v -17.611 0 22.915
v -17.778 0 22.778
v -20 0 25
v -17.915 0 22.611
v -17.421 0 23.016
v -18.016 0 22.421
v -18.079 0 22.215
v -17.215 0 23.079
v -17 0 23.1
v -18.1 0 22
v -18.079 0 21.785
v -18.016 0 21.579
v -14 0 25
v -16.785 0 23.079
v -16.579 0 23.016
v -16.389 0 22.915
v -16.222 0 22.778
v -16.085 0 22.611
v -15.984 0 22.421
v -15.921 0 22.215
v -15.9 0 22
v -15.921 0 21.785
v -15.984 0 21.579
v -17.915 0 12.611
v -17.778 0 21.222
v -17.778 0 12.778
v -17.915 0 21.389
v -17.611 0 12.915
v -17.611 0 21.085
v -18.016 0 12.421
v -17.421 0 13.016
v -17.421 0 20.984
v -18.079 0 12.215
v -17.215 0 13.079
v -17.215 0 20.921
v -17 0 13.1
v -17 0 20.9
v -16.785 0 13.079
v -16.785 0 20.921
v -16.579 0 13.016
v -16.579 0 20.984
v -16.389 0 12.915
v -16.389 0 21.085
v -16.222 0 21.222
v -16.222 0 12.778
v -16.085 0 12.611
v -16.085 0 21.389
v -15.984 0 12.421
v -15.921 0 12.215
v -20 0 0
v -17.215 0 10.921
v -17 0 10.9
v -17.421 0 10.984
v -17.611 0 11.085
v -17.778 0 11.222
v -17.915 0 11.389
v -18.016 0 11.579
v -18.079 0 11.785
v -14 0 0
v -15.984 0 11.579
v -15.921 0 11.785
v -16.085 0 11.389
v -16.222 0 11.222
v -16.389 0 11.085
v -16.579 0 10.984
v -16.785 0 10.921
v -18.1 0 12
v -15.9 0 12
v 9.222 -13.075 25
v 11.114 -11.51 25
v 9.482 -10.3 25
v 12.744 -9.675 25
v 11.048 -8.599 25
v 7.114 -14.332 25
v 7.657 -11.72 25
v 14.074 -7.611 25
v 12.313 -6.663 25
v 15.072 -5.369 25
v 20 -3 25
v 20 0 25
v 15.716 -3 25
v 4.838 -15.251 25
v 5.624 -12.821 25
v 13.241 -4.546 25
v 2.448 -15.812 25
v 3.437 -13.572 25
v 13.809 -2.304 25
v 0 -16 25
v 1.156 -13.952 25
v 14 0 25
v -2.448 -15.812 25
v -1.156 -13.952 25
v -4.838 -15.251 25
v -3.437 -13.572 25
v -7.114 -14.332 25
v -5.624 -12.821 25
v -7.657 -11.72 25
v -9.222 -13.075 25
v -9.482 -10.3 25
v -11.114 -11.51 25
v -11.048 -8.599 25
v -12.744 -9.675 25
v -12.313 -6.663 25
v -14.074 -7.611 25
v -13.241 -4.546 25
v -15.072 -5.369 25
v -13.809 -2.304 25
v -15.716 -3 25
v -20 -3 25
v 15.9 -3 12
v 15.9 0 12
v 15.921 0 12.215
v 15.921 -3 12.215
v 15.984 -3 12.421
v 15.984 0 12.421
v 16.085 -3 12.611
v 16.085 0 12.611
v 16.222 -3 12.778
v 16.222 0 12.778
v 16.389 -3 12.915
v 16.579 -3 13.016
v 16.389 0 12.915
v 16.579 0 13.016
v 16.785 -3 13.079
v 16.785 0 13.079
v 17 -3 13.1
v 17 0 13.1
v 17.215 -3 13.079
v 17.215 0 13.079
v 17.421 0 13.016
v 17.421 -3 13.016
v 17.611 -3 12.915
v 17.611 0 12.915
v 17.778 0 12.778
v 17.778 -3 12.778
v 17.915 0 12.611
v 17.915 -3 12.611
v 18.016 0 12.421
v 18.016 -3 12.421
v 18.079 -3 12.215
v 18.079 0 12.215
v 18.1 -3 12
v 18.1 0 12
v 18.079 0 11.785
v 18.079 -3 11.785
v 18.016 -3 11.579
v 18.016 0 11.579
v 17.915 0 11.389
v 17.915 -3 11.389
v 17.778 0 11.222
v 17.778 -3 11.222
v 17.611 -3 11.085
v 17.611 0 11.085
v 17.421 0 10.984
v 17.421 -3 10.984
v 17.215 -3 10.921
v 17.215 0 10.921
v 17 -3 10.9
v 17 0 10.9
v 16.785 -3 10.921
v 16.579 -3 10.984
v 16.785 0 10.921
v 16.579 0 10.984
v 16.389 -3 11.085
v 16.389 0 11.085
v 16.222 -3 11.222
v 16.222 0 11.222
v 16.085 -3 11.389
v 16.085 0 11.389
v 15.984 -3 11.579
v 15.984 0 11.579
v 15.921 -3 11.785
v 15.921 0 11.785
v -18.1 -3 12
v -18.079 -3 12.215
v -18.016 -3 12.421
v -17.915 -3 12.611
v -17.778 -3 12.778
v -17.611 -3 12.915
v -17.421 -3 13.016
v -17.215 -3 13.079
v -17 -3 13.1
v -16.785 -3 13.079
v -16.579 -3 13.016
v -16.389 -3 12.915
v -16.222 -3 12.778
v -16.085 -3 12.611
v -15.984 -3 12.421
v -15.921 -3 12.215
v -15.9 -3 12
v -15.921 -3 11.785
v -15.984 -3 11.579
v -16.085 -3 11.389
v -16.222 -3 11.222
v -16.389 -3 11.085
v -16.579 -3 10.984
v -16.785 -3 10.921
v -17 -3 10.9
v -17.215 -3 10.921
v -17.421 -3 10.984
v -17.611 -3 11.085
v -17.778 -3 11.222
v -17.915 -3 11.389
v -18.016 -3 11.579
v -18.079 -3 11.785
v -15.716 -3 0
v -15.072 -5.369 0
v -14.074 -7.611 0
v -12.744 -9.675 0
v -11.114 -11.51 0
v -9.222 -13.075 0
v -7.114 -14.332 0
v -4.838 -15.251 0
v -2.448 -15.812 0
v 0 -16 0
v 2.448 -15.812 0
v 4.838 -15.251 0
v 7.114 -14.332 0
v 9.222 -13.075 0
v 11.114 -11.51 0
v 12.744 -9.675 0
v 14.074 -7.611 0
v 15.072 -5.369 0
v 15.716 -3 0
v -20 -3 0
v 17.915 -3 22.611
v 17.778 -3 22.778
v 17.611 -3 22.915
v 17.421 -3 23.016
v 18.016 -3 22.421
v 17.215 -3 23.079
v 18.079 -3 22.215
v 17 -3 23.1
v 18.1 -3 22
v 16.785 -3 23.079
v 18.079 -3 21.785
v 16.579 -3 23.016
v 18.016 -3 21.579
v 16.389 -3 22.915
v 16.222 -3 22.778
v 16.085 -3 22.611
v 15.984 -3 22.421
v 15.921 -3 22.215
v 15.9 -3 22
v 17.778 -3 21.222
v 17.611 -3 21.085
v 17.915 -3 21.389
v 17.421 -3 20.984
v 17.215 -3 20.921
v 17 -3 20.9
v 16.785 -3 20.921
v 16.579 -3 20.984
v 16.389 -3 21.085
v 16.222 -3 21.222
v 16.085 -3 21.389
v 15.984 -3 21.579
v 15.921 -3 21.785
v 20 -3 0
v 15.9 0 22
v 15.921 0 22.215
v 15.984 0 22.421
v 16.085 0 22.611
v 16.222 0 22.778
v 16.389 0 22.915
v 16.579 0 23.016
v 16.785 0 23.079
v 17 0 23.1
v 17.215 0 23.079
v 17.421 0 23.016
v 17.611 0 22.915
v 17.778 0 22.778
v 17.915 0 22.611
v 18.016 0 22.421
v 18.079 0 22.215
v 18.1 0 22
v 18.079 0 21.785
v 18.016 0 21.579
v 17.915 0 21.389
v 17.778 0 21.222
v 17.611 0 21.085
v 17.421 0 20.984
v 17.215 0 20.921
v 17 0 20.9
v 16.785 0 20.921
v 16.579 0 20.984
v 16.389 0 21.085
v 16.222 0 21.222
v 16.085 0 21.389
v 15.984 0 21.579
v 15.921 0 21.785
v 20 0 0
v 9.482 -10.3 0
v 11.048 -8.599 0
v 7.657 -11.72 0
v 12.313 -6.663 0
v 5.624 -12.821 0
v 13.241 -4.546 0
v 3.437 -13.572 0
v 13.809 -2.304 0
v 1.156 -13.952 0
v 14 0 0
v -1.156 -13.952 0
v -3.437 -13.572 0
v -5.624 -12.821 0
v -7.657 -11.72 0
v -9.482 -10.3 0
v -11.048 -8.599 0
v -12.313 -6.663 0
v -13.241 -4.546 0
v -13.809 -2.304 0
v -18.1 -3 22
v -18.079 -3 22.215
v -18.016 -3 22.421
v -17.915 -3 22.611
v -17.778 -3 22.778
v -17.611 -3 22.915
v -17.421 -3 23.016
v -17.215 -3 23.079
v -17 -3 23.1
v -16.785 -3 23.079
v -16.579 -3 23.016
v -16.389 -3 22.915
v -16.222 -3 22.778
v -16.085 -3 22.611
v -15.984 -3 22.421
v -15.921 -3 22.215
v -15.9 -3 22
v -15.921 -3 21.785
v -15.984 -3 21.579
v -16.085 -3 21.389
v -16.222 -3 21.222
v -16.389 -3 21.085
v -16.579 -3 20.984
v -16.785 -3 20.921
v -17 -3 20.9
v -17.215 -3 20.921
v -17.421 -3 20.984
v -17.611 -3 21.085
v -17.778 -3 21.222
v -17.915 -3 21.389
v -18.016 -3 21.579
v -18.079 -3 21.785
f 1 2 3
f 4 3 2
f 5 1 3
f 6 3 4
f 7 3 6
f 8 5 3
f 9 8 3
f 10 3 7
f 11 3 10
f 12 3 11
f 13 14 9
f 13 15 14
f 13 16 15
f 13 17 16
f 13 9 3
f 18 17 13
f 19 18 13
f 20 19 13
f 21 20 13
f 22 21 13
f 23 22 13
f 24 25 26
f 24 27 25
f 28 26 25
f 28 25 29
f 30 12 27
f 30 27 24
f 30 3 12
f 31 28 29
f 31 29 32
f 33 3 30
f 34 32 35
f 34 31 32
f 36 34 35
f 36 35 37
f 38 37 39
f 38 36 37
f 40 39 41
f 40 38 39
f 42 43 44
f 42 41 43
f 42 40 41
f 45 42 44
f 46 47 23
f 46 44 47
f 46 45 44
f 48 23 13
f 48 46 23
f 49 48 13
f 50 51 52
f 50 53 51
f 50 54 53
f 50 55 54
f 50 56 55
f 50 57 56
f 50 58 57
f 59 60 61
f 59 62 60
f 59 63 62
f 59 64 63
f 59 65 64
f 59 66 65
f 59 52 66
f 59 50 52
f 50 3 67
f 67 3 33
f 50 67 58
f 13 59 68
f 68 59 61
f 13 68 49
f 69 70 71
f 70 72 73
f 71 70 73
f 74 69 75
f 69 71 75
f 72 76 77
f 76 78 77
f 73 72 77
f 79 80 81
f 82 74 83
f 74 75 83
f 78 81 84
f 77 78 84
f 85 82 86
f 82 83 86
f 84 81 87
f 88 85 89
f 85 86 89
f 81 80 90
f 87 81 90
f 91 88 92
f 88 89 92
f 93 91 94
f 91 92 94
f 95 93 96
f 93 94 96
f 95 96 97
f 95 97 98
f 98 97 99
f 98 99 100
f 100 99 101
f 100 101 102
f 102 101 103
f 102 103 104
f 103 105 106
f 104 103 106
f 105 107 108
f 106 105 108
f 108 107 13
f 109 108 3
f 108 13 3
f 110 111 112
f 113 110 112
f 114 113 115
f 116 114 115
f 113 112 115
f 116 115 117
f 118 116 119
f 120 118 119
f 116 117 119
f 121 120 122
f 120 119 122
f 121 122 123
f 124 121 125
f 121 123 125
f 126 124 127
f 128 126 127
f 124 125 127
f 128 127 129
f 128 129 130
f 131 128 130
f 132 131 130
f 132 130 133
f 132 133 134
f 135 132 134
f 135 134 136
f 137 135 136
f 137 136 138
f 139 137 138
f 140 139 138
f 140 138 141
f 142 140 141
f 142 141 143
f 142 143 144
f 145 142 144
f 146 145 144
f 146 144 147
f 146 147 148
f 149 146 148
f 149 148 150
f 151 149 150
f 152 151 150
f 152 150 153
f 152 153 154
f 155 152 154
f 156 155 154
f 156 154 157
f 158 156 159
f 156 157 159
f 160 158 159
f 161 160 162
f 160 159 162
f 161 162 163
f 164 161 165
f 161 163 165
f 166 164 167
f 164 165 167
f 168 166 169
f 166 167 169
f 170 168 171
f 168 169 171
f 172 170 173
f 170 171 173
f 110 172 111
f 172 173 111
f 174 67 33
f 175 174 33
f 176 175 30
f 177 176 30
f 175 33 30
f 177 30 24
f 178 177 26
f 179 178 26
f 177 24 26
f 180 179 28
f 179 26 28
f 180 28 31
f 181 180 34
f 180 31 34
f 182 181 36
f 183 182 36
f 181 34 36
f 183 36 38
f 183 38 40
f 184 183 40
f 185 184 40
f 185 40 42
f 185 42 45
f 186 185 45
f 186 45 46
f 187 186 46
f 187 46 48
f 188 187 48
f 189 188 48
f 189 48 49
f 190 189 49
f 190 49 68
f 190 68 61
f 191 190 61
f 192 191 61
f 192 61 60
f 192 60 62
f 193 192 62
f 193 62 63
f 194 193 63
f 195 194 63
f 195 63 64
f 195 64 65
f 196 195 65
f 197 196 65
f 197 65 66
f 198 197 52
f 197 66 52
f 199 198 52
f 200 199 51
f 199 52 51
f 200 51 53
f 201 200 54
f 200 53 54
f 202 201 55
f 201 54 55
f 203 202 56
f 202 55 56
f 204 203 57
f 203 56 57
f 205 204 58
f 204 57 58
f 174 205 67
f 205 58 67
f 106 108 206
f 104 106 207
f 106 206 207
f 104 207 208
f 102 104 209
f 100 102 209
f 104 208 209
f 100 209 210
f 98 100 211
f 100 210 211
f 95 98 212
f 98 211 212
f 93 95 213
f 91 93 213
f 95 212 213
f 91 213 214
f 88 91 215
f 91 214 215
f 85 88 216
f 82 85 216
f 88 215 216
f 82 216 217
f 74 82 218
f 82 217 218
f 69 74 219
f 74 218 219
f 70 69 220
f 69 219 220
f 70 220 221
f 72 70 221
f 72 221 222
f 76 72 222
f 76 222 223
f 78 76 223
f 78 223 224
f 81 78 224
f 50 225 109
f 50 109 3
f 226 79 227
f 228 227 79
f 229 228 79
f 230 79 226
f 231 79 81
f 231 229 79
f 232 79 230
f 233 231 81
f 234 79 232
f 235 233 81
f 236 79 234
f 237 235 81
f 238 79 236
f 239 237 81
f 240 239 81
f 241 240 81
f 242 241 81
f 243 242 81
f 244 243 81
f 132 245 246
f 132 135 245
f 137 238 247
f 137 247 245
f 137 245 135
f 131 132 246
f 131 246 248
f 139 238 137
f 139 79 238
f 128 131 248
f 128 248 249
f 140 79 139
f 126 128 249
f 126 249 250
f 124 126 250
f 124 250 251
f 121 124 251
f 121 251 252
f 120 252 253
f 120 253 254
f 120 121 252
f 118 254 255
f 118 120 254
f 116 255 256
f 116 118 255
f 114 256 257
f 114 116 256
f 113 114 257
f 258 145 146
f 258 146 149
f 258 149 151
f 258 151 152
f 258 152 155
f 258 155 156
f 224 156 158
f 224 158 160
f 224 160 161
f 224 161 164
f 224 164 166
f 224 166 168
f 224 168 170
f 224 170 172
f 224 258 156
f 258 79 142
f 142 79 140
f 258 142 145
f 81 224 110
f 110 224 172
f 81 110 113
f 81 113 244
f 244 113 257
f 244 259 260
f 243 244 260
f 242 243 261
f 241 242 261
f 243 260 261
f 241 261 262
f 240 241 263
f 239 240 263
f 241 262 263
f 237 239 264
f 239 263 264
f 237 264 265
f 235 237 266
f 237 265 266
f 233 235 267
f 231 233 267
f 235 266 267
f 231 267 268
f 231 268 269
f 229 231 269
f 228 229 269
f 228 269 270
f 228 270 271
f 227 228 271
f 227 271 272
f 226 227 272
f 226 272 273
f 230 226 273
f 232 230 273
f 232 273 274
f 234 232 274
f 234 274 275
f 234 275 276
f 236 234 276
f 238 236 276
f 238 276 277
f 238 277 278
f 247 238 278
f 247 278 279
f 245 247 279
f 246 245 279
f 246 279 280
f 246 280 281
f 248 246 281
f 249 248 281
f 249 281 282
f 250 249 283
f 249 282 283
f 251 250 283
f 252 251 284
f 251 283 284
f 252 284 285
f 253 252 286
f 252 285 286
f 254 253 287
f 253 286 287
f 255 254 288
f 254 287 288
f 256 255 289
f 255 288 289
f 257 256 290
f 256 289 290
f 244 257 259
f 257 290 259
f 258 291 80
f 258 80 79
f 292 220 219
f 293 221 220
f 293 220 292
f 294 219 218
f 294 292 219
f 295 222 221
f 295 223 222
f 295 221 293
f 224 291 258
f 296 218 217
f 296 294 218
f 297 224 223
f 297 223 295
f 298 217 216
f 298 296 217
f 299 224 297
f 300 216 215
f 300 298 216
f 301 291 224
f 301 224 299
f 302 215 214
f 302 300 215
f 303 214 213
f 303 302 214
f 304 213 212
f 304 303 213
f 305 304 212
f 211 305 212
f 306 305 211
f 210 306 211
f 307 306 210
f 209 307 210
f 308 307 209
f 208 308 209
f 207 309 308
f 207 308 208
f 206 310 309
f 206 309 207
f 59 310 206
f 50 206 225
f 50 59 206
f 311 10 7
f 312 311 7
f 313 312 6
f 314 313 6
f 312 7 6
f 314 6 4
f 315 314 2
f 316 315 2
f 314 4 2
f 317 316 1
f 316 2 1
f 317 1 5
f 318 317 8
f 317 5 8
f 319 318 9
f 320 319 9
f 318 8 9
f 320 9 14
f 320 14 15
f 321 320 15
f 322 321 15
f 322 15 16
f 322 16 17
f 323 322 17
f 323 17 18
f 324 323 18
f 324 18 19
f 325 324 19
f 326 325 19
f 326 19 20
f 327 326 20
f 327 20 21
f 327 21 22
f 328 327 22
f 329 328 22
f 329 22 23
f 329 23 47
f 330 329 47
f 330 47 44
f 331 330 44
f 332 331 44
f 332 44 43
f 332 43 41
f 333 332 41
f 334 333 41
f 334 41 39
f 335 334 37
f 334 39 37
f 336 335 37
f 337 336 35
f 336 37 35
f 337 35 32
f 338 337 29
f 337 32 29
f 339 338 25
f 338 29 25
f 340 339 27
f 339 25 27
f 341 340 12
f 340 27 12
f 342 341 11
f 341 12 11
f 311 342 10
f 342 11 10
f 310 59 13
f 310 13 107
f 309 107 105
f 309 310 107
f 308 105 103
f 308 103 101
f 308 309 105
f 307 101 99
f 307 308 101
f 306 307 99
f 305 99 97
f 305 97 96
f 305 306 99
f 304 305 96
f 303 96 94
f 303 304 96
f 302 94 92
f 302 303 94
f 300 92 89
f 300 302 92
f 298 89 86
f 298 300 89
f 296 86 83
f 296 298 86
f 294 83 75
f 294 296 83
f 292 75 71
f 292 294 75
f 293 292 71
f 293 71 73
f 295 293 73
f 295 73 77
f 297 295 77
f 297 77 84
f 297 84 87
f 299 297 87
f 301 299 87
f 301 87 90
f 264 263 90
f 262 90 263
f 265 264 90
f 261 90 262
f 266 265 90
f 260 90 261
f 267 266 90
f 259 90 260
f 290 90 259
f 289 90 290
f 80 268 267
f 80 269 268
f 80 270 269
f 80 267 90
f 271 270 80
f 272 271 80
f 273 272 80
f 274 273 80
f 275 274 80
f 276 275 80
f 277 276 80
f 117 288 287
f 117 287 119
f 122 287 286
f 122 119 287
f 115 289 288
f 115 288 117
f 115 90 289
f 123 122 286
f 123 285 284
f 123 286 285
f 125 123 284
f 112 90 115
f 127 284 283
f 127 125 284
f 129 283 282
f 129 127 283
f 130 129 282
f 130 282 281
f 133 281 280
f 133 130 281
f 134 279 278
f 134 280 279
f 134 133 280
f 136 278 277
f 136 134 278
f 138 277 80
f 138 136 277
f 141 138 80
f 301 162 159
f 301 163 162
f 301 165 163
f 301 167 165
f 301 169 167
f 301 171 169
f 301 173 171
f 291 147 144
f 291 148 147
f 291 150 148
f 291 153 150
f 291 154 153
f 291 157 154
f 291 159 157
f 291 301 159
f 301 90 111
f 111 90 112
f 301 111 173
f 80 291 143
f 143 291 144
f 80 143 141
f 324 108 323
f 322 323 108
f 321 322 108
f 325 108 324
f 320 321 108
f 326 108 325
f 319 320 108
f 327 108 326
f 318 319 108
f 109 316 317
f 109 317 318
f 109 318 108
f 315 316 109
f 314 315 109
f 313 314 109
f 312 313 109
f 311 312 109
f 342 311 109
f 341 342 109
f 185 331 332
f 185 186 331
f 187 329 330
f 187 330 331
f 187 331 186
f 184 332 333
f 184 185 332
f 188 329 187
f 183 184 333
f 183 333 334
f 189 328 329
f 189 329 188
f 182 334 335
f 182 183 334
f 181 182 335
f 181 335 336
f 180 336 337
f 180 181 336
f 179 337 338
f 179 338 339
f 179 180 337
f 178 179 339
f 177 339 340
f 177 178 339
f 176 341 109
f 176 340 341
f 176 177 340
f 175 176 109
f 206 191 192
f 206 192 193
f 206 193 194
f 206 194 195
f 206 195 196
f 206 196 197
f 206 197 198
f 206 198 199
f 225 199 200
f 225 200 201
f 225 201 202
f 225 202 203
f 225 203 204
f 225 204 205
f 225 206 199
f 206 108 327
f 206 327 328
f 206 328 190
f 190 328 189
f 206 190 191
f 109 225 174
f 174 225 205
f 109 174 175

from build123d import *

# Parameters (mm, degrees)
PAD_DEPTH    = 25
SKETCH001_R  = 1.1
POCKET_DEPTH = 16.001


with BuildPart() as part:
    # Sketch → Pad (new body)
    with BuildSketch(Plane.XY):
        with BuildLine():
            Line((-15.716234, -3), (-20, -3))
            Line((-20, -3), (-20, 0))
            Line((-20, 0), (-14, 0))
            ThreePointArc((-14, 0), (0, -14), (14, 0))
            Line((14, 0), (20, 0))
            Line((20, 0), (20, -3))
            Line((20, -3), (15.716234, -3))
            ThreePointArc((-15.716234, -3), (0, -16), (15.716234, -3))
        make_face()
    extrude(amount=PAD_DEPTH)

    # Sketch001 → Pocket (cut, through all)
    with BuildSketch(Plane(origin=(0, 0, 0), x_dir=(-1, 0, 0), z_dir=(0, 1, 0))):
        with Locations((-17, 22)):
            Circle(SKETCH001_R)
        with Locations((-17, 12)):
            Circle(SKETCH001_R)
        with Locations((17, 22)):
            Circle(SKETCH001_R)
        with Locations((17, 12)):
            Circle(SKETCH001_R)
    extrude(amount=-POCKET_DEPTH, mode=Mode.SUBTRACT)


solid = part.part
